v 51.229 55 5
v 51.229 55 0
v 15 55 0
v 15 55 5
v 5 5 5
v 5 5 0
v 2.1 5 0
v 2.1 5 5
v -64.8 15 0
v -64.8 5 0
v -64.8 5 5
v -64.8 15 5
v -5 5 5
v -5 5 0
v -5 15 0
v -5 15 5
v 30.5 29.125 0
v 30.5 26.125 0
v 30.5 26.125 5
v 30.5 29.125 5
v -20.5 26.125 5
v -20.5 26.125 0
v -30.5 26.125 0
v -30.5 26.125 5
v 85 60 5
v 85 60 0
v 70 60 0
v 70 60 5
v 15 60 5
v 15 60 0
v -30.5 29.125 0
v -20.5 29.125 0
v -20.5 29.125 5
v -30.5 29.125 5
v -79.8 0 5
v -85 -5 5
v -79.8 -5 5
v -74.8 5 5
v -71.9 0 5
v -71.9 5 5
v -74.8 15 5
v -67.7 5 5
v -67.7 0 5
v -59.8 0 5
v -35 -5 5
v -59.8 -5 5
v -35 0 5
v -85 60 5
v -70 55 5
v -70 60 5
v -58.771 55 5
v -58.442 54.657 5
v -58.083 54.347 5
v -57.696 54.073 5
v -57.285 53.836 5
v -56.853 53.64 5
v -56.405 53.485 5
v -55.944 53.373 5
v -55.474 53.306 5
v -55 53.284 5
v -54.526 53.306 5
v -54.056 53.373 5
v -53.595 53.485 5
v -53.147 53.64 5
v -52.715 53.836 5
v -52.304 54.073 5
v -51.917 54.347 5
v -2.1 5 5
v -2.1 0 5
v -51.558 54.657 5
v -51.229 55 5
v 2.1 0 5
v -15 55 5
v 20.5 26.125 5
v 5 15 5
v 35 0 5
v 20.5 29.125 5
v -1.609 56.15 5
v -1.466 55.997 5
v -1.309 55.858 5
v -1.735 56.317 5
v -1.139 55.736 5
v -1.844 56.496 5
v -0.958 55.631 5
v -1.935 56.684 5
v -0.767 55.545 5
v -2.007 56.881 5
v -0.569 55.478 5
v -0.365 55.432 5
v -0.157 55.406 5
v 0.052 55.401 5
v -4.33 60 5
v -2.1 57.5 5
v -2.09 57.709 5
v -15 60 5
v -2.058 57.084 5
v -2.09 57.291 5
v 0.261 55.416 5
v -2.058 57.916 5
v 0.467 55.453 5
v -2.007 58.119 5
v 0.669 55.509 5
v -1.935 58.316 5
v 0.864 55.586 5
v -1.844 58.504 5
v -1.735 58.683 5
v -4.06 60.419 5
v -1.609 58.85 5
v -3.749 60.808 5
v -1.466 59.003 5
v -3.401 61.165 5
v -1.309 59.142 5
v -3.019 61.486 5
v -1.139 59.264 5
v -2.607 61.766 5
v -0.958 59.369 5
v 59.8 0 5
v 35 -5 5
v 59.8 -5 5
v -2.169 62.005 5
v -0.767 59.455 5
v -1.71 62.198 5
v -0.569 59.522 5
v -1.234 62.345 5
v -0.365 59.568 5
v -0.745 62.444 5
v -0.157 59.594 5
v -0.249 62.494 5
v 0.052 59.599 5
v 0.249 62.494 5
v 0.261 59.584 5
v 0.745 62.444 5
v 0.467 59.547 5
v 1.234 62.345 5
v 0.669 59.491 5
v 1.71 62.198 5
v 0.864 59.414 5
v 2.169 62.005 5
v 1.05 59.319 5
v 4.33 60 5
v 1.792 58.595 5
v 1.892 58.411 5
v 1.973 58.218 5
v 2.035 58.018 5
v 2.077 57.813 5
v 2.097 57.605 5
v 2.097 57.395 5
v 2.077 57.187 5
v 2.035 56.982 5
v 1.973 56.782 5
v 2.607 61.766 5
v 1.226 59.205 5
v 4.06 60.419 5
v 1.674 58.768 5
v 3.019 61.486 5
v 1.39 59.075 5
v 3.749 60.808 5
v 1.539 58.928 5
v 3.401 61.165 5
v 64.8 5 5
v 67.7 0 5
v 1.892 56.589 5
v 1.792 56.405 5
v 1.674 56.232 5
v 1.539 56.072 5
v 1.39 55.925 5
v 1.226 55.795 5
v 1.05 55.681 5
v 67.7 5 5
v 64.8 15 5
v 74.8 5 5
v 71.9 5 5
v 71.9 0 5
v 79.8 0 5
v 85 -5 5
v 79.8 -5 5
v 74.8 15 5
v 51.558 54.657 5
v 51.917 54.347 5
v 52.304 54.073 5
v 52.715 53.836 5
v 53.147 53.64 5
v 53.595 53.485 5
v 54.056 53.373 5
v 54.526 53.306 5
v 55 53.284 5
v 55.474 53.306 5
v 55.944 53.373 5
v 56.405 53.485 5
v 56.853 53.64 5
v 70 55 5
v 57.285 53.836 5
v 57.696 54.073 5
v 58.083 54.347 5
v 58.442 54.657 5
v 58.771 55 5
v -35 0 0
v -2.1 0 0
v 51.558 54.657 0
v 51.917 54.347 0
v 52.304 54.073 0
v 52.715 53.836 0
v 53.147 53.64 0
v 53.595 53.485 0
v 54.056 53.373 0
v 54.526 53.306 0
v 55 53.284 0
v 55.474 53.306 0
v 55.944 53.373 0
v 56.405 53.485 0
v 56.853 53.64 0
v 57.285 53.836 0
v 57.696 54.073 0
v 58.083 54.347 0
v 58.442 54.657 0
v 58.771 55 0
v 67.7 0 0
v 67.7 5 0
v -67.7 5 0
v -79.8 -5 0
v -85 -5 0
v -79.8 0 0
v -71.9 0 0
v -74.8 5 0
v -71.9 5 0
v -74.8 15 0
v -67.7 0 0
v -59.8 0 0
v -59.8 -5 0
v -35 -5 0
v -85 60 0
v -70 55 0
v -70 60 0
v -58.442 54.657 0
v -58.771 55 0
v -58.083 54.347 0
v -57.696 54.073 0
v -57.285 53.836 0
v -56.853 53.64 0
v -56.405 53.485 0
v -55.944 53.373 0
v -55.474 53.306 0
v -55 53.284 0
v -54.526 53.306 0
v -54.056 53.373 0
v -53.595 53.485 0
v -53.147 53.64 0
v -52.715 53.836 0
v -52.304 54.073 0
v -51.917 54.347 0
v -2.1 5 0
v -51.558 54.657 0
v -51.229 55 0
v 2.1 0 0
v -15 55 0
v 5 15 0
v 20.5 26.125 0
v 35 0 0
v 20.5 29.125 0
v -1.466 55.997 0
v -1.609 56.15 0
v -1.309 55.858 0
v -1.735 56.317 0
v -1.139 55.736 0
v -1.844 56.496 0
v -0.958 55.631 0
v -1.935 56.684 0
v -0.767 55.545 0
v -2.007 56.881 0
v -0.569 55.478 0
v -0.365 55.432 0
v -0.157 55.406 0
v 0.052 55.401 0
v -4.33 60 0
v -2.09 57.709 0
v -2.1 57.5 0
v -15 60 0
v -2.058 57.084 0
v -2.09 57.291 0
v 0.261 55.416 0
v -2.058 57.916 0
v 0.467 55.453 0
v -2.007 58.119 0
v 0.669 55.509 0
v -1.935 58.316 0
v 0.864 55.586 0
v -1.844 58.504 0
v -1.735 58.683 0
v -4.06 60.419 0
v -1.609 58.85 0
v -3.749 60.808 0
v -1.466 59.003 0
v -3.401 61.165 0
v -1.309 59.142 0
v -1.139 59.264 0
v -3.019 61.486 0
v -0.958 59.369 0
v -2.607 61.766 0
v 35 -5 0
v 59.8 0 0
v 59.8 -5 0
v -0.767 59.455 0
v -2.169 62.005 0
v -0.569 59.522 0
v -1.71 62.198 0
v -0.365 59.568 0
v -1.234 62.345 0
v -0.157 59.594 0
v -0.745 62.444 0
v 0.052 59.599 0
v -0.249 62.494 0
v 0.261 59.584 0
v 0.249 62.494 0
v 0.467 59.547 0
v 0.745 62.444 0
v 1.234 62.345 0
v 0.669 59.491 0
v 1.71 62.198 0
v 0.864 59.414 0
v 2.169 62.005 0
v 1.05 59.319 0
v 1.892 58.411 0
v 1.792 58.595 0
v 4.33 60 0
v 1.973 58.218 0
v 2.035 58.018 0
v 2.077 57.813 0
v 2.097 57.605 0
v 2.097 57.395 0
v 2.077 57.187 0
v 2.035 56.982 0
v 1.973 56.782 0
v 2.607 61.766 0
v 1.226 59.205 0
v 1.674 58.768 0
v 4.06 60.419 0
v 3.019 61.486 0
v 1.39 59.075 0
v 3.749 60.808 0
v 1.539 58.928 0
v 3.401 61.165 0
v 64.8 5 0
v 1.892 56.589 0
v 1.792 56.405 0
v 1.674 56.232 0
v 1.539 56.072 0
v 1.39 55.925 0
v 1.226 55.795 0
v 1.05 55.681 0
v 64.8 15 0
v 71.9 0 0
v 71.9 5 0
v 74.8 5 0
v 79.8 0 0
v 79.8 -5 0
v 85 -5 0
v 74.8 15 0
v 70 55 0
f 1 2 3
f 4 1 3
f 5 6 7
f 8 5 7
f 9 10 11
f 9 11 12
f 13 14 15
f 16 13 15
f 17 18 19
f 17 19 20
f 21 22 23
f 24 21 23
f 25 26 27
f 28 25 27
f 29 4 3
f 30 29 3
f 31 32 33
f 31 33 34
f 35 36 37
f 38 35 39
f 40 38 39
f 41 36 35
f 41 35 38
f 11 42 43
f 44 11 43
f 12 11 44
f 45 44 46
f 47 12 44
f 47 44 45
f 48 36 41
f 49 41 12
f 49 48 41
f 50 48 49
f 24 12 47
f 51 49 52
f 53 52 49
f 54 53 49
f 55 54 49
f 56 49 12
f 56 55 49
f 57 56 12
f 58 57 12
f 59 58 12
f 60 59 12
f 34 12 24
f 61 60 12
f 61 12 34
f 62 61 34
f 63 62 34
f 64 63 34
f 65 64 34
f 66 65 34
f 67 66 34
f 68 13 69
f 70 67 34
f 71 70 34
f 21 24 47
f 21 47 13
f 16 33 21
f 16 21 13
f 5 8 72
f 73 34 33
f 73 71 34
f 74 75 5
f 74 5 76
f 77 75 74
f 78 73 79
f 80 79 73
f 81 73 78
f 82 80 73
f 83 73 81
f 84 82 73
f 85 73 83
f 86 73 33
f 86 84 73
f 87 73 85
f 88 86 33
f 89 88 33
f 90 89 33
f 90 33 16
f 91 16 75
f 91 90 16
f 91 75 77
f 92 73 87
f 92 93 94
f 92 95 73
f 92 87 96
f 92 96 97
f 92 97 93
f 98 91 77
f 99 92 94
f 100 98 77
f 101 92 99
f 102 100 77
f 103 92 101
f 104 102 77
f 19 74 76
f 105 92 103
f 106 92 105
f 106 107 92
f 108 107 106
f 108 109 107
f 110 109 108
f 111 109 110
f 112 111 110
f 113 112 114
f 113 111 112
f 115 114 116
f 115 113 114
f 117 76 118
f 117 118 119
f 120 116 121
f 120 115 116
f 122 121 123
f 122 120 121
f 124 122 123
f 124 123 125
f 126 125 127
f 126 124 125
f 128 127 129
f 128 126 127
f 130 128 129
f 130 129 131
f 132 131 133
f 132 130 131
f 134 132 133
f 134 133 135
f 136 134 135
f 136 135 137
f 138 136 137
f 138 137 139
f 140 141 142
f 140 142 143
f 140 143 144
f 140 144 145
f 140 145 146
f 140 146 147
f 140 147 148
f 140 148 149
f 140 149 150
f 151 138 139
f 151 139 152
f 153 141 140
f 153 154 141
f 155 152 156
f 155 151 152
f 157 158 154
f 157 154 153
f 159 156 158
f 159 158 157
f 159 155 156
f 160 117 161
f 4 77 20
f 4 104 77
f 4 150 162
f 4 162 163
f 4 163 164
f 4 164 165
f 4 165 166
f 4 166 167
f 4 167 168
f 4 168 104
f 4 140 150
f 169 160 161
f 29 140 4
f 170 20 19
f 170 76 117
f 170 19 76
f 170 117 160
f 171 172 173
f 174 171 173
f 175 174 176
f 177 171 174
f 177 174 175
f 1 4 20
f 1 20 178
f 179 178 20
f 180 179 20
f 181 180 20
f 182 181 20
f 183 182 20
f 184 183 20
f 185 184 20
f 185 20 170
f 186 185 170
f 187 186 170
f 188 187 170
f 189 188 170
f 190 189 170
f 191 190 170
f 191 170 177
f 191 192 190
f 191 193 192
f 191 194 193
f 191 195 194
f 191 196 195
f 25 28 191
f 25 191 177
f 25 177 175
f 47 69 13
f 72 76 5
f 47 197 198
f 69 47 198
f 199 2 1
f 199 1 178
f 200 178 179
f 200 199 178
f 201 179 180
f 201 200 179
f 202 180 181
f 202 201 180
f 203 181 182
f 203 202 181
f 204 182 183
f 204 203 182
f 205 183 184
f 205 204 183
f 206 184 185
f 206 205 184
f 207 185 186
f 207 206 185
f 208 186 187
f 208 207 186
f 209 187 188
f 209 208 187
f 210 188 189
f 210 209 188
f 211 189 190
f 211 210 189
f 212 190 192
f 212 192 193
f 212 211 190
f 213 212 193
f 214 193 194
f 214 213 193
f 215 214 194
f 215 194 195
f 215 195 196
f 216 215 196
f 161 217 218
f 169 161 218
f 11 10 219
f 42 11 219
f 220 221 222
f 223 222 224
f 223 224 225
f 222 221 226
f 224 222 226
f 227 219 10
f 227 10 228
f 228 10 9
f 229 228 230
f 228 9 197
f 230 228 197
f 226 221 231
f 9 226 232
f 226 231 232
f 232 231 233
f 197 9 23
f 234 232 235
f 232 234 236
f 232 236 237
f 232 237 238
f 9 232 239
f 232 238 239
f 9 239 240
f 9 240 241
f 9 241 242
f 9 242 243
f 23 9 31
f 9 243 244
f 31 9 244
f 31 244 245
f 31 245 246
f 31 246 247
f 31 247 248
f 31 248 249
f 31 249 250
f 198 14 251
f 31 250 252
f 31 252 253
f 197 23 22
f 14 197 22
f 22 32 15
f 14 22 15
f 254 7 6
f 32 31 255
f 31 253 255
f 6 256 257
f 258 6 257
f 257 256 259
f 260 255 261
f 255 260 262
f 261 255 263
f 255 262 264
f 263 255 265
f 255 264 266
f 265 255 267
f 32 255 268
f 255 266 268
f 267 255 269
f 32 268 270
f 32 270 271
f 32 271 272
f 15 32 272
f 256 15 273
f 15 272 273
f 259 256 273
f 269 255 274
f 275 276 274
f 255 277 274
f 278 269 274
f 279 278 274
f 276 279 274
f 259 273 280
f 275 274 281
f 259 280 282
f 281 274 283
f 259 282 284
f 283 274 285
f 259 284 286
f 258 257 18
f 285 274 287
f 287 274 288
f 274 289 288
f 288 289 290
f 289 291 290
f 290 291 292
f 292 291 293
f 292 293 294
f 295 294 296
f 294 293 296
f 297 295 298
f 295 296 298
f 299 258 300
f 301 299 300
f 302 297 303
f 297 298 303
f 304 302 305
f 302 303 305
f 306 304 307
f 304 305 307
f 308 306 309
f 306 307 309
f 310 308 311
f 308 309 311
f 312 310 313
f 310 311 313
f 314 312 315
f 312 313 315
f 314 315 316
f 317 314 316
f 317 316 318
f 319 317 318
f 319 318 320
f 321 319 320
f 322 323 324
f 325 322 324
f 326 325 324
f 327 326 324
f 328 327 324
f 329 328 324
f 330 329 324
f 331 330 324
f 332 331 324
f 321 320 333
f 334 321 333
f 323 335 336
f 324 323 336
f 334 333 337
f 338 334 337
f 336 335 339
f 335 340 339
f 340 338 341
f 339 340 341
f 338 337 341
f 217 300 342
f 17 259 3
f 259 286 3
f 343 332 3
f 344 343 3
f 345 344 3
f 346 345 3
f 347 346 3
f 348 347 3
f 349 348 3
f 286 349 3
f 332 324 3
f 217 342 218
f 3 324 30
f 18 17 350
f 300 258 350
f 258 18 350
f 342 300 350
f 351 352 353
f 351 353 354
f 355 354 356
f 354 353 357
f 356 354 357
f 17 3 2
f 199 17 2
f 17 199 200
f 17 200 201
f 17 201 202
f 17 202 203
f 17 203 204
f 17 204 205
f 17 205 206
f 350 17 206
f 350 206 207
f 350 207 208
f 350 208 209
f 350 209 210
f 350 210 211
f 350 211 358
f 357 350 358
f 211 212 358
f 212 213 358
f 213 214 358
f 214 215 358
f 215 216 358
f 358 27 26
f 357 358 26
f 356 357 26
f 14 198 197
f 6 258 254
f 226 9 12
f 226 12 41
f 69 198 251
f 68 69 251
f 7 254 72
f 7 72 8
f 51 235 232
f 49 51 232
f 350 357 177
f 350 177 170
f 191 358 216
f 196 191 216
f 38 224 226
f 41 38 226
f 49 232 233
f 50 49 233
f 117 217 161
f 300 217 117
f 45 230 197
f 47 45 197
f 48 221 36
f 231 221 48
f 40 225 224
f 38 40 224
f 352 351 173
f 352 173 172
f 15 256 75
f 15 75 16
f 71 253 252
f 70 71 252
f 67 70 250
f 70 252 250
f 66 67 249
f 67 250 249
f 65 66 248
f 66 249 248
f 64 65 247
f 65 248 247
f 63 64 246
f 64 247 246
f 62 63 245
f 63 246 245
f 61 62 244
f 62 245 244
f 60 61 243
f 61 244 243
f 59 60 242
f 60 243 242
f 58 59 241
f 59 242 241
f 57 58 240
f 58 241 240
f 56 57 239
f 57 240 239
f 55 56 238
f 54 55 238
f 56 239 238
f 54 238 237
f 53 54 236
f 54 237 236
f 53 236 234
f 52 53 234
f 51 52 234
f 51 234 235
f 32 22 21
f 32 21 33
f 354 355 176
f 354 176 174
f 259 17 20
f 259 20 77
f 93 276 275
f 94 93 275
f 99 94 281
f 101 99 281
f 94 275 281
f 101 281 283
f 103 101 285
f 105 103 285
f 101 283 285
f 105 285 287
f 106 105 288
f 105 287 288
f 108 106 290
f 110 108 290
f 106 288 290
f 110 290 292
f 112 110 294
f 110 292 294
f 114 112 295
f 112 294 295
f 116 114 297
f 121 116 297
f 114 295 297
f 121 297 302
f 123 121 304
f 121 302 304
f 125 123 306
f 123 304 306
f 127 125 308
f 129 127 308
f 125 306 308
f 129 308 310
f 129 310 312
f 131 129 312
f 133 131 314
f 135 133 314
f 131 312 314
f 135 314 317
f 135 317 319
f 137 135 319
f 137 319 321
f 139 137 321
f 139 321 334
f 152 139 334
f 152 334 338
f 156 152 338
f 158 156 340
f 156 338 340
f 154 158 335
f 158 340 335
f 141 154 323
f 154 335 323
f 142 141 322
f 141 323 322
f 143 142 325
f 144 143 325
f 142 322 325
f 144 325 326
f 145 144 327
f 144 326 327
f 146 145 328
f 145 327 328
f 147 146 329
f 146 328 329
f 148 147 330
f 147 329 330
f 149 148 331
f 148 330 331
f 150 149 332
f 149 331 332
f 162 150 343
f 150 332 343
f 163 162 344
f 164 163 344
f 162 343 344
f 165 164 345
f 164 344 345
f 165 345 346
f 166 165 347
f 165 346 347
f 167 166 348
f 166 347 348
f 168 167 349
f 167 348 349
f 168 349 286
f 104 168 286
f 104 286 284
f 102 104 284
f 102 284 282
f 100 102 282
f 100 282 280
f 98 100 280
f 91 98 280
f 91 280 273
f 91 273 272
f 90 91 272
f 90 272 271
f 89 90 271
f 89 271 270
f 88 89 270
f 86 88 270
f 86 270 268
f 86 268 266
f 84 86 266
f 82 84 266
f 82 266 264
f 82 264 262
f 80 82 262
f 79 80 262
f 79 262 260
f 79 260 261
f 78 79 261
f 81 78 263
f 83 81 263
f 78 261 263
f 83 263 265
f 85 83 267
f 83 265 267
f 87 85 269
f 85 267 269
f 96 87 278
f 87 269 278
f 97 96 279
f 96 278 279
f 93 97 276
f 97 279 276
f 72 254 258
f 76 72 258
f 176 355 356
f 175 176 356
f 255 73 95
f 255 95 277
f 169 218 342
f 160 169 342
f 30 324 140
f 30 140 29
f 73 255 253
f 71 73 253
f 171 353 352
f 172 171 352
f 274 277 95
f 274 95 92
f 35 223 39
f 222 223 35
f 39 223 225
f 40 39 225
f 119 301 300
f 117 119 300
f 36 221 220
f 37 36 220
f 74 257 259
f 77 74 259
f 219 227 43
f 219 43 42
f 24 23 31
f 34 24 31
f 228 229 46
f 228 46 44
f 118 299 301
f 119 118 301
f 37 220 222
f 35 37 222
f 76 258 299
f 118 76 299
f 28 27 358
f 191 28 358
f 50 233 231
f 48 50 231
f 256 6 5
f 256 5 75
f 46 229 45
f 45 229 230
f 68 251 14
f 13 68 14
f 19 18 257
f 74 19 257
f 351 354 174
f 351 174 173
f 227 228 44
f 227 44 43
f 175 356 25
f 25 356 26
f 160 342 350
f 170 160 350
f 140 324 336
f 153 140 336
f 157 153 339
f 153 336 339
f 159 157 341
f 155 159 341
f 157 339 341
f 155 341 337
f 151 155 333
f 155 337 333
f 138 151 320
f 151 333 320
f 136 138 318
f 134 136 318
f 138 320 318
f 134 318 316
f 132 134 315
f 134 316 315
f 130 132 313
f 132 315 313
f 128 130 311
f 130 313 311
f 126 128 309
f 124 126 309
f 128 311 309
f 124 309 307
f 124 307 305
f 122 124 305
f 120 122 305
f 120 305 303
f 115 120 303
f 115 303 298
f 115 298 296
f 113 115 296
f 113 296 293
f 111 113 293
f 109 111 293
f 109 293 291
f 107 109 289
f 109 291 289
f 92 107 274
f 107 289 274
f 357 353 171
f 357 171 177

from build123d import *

# Parameters (mm, degrees)
BOSS_EXTRUDE1_DEPTH = 5
SKETCH2_W           = 35
SKETCH2_H           = 65
CUT_EXTRUDE1_DEPTH  = 10
CUT_EXTRUDE2_DEPTH  = 5
SKETCH4_W           = 30
SKETCH4_H           = 5
BOSS_EXTRUDE2_DEPTH = 5
SKETCH5_W           = 20
SKETCH5_H           = 5
CUT_EXTRUDE3_DEPTH  = 5
SKETCH6_R           = 2.1
CUT_EXTRUDE4_DEPTH  = 5
BOSS_EXTRUDE3_DEPTH = 5
SKETCH8_W           = 4.2
SKETCH8_H           = 5
SKETCH8_W_2         = 10
SKETCH8_H_2         = 10
CUT_EXTRUDE5_DEPTH  = 5
SKETCH9_W           = 10
SKETCH9_H           = 3
CUT_EXTRUDE6_DEPTH  = 10


with BuildPart() as part:
    # Sketch1 → Boss-Extrude1 (new body)
    with BuildSketch(Plane.XY):
        Polygon((95, -5), (95, 0), (115, 0), (115, 15), (120, 15), (120, 40), (115, 40), (115, 55), (100, 55), (100, 60), (70, 60), (70, 55), (-70, 55), (-70, 60), (-100, 60), (-100, 55), (-115, 55), (-115, 40), (-120, 40), (-120, 15), (-115, 15), (-115, 0), (-95, 0), (-95, -5), (-35, -5), (-35, 0), (35, 0), (35, -5), align=None)
    extrude(amount=BOSS_EXTRUDE1_DEPTH)

    # Sketch2 → Cut-Extrude1 (cut)
    with BuildSketch(Plane(origin=(0, 0, 0), x_dir=(-1, 0, 0), z_dir=(0, 0, -1))):
        with Locations((102.5, 27.5)):
            Rectangle(SKETCH2_W, SKETCH2_H)
        with Locations((-102.5, 27.5)):
            Rectangle(SKETCH2_W, SKETCH2_H)
    extrude(amount=-CUT_EXTRUDE1_DEPTH, mode=Mode.SUBTRACT)

    # Sketch3 → Cut-Extrude2 (cut)
    with BuildSketch(Plane(origin=(0, 0, 0), x_dir=(-1, 0, 0), z_dir=(0, 0, -1))):
        with BuildLine():
            Line((58.770676698, 55), (51.229323302, 55))
            ThreePointArc((51.229323302, 55), (55, 53.28359517), (58.770676698, 55))
        make_face()
        with BuildLine():
            Line((-58.770676698, 55), (-51.229323302, 55))
            ThreePointArc((-51.229323302, 55), (-55, 53.28359517), (-58.770676698, 55))
        make_face()
    extrude(amount=-CUT_EXTRUDE2_DEPTH, mode=Mode.SUBTRACT)

    # Sketch4 → Boss-Extrude2 (add)
    with BuildSketch(Plane(origin=(0, 55, 0), x_dir=(1, 0, 0), z_dir=(0, 1, 0))):
        with Locations((0, -2.5)):
            Rectangle(SKETCH4_W, SKETCH4_H)
    extrude(amount=BOSS_EXTRUDE2_DEPTH)

    # Sketch5 → Cut-Extrude3 (cut)
    with BuildSketch(Plane(origin=(0, 0, 0), x_dir=(-1, 0, 0), z_dir=(0, 0, -1))):
        with Locations((-69.8, -2.5)):
            Rectangle(SKETCH5_W, SKETCH5_H)
        with Locations((69.8, -2.5)):
            Rectangle(SKETCH5_W, SKETCH5_H)
    extrude(amount=-CUT_EXTRUDE3_DEPTH, mode=Mode.SUBTRACT)

    # Sketch6 → Cut-Extrude4 (cut)
    with BuildSketch(Plane(origin=(0, 0, 0), x_dir=(-1, 0, 0), z_dir=(0, 0, -1))):
        with Locations((0, 57.5)):
            Circle(SKETCH6_R)
    extrude(amount=-CUT_EXTRUDE4_DEPTH, mode=Mode.SUBTRACT)

    # Sketch7 → Boss-Extrude3 (add)
    with BuildSketch(Plane(origin=(0, 0, 0), x_dir=(-1, 0, 0), z_dir=(0, 0, -1))):
        with BuildLine():
            Line((4.330127019, 60), (-4.330127019, 60))
            ThreePointArc((-4.330127019, 60), (0, 62.5), (4.330127019, 60))
        make_face()
    extrude(amount=-BOSS_EXTRUDE3_DEPTH)

    # Sketch8 → Cut-Extrude5 (cut)
    with BuildSketch(Plane(origin=(0, 0, 0), x_dir=(-1, 0, 0), z_dir=(0, 0, -1))):
        with Locations((69.8, 2.5)):
            Rectangle(SKETCH8_W, SKETCH8_H)
        with Locations((69.8, 10)):
            Rectangle(SKETCH8_W_2, SKETCH8_H_2)
        with Locations((-69.8, 10)):
            Rectangle(SKETCH8_W_2, SKETCH8_H_2)
        with Locations((-69.8, 2.5)):
            Rectangle(SKETCH8_W, SKETCH8_H)
        with Locations((0, 2.5)):
            Rectangle(SKETCH8_W, SKETCH8_H)
        with Locations((0, 10)):
            Rectangle(SKETCH8_W_2, SKETCH8_H_2)
    extrude(amount=-CUT_EXTRUDE5_DEPTH, mode=Mode.SUBTRACT)

    # Sketch9 → Cut-Extrude6 (cut)
    with BuildSketch(Plane(origin=(0, 0, 0), x_dir=(-1, 0, 0), z_dir=(0, 0, -1))):
        with Locations((-25.5, 27.625214192)):
            Rectangle(SKETCH9_W, SKETCH9_H)
        with Locations((25.5, 27.625214192)):
            Rectangle(SKETCH9_W, SKETCH9_H)
    extrude(amount=-CUT_EXTRUDE6_DEPTH, mode=Mode.SUBTRACT)


solid = part.part
